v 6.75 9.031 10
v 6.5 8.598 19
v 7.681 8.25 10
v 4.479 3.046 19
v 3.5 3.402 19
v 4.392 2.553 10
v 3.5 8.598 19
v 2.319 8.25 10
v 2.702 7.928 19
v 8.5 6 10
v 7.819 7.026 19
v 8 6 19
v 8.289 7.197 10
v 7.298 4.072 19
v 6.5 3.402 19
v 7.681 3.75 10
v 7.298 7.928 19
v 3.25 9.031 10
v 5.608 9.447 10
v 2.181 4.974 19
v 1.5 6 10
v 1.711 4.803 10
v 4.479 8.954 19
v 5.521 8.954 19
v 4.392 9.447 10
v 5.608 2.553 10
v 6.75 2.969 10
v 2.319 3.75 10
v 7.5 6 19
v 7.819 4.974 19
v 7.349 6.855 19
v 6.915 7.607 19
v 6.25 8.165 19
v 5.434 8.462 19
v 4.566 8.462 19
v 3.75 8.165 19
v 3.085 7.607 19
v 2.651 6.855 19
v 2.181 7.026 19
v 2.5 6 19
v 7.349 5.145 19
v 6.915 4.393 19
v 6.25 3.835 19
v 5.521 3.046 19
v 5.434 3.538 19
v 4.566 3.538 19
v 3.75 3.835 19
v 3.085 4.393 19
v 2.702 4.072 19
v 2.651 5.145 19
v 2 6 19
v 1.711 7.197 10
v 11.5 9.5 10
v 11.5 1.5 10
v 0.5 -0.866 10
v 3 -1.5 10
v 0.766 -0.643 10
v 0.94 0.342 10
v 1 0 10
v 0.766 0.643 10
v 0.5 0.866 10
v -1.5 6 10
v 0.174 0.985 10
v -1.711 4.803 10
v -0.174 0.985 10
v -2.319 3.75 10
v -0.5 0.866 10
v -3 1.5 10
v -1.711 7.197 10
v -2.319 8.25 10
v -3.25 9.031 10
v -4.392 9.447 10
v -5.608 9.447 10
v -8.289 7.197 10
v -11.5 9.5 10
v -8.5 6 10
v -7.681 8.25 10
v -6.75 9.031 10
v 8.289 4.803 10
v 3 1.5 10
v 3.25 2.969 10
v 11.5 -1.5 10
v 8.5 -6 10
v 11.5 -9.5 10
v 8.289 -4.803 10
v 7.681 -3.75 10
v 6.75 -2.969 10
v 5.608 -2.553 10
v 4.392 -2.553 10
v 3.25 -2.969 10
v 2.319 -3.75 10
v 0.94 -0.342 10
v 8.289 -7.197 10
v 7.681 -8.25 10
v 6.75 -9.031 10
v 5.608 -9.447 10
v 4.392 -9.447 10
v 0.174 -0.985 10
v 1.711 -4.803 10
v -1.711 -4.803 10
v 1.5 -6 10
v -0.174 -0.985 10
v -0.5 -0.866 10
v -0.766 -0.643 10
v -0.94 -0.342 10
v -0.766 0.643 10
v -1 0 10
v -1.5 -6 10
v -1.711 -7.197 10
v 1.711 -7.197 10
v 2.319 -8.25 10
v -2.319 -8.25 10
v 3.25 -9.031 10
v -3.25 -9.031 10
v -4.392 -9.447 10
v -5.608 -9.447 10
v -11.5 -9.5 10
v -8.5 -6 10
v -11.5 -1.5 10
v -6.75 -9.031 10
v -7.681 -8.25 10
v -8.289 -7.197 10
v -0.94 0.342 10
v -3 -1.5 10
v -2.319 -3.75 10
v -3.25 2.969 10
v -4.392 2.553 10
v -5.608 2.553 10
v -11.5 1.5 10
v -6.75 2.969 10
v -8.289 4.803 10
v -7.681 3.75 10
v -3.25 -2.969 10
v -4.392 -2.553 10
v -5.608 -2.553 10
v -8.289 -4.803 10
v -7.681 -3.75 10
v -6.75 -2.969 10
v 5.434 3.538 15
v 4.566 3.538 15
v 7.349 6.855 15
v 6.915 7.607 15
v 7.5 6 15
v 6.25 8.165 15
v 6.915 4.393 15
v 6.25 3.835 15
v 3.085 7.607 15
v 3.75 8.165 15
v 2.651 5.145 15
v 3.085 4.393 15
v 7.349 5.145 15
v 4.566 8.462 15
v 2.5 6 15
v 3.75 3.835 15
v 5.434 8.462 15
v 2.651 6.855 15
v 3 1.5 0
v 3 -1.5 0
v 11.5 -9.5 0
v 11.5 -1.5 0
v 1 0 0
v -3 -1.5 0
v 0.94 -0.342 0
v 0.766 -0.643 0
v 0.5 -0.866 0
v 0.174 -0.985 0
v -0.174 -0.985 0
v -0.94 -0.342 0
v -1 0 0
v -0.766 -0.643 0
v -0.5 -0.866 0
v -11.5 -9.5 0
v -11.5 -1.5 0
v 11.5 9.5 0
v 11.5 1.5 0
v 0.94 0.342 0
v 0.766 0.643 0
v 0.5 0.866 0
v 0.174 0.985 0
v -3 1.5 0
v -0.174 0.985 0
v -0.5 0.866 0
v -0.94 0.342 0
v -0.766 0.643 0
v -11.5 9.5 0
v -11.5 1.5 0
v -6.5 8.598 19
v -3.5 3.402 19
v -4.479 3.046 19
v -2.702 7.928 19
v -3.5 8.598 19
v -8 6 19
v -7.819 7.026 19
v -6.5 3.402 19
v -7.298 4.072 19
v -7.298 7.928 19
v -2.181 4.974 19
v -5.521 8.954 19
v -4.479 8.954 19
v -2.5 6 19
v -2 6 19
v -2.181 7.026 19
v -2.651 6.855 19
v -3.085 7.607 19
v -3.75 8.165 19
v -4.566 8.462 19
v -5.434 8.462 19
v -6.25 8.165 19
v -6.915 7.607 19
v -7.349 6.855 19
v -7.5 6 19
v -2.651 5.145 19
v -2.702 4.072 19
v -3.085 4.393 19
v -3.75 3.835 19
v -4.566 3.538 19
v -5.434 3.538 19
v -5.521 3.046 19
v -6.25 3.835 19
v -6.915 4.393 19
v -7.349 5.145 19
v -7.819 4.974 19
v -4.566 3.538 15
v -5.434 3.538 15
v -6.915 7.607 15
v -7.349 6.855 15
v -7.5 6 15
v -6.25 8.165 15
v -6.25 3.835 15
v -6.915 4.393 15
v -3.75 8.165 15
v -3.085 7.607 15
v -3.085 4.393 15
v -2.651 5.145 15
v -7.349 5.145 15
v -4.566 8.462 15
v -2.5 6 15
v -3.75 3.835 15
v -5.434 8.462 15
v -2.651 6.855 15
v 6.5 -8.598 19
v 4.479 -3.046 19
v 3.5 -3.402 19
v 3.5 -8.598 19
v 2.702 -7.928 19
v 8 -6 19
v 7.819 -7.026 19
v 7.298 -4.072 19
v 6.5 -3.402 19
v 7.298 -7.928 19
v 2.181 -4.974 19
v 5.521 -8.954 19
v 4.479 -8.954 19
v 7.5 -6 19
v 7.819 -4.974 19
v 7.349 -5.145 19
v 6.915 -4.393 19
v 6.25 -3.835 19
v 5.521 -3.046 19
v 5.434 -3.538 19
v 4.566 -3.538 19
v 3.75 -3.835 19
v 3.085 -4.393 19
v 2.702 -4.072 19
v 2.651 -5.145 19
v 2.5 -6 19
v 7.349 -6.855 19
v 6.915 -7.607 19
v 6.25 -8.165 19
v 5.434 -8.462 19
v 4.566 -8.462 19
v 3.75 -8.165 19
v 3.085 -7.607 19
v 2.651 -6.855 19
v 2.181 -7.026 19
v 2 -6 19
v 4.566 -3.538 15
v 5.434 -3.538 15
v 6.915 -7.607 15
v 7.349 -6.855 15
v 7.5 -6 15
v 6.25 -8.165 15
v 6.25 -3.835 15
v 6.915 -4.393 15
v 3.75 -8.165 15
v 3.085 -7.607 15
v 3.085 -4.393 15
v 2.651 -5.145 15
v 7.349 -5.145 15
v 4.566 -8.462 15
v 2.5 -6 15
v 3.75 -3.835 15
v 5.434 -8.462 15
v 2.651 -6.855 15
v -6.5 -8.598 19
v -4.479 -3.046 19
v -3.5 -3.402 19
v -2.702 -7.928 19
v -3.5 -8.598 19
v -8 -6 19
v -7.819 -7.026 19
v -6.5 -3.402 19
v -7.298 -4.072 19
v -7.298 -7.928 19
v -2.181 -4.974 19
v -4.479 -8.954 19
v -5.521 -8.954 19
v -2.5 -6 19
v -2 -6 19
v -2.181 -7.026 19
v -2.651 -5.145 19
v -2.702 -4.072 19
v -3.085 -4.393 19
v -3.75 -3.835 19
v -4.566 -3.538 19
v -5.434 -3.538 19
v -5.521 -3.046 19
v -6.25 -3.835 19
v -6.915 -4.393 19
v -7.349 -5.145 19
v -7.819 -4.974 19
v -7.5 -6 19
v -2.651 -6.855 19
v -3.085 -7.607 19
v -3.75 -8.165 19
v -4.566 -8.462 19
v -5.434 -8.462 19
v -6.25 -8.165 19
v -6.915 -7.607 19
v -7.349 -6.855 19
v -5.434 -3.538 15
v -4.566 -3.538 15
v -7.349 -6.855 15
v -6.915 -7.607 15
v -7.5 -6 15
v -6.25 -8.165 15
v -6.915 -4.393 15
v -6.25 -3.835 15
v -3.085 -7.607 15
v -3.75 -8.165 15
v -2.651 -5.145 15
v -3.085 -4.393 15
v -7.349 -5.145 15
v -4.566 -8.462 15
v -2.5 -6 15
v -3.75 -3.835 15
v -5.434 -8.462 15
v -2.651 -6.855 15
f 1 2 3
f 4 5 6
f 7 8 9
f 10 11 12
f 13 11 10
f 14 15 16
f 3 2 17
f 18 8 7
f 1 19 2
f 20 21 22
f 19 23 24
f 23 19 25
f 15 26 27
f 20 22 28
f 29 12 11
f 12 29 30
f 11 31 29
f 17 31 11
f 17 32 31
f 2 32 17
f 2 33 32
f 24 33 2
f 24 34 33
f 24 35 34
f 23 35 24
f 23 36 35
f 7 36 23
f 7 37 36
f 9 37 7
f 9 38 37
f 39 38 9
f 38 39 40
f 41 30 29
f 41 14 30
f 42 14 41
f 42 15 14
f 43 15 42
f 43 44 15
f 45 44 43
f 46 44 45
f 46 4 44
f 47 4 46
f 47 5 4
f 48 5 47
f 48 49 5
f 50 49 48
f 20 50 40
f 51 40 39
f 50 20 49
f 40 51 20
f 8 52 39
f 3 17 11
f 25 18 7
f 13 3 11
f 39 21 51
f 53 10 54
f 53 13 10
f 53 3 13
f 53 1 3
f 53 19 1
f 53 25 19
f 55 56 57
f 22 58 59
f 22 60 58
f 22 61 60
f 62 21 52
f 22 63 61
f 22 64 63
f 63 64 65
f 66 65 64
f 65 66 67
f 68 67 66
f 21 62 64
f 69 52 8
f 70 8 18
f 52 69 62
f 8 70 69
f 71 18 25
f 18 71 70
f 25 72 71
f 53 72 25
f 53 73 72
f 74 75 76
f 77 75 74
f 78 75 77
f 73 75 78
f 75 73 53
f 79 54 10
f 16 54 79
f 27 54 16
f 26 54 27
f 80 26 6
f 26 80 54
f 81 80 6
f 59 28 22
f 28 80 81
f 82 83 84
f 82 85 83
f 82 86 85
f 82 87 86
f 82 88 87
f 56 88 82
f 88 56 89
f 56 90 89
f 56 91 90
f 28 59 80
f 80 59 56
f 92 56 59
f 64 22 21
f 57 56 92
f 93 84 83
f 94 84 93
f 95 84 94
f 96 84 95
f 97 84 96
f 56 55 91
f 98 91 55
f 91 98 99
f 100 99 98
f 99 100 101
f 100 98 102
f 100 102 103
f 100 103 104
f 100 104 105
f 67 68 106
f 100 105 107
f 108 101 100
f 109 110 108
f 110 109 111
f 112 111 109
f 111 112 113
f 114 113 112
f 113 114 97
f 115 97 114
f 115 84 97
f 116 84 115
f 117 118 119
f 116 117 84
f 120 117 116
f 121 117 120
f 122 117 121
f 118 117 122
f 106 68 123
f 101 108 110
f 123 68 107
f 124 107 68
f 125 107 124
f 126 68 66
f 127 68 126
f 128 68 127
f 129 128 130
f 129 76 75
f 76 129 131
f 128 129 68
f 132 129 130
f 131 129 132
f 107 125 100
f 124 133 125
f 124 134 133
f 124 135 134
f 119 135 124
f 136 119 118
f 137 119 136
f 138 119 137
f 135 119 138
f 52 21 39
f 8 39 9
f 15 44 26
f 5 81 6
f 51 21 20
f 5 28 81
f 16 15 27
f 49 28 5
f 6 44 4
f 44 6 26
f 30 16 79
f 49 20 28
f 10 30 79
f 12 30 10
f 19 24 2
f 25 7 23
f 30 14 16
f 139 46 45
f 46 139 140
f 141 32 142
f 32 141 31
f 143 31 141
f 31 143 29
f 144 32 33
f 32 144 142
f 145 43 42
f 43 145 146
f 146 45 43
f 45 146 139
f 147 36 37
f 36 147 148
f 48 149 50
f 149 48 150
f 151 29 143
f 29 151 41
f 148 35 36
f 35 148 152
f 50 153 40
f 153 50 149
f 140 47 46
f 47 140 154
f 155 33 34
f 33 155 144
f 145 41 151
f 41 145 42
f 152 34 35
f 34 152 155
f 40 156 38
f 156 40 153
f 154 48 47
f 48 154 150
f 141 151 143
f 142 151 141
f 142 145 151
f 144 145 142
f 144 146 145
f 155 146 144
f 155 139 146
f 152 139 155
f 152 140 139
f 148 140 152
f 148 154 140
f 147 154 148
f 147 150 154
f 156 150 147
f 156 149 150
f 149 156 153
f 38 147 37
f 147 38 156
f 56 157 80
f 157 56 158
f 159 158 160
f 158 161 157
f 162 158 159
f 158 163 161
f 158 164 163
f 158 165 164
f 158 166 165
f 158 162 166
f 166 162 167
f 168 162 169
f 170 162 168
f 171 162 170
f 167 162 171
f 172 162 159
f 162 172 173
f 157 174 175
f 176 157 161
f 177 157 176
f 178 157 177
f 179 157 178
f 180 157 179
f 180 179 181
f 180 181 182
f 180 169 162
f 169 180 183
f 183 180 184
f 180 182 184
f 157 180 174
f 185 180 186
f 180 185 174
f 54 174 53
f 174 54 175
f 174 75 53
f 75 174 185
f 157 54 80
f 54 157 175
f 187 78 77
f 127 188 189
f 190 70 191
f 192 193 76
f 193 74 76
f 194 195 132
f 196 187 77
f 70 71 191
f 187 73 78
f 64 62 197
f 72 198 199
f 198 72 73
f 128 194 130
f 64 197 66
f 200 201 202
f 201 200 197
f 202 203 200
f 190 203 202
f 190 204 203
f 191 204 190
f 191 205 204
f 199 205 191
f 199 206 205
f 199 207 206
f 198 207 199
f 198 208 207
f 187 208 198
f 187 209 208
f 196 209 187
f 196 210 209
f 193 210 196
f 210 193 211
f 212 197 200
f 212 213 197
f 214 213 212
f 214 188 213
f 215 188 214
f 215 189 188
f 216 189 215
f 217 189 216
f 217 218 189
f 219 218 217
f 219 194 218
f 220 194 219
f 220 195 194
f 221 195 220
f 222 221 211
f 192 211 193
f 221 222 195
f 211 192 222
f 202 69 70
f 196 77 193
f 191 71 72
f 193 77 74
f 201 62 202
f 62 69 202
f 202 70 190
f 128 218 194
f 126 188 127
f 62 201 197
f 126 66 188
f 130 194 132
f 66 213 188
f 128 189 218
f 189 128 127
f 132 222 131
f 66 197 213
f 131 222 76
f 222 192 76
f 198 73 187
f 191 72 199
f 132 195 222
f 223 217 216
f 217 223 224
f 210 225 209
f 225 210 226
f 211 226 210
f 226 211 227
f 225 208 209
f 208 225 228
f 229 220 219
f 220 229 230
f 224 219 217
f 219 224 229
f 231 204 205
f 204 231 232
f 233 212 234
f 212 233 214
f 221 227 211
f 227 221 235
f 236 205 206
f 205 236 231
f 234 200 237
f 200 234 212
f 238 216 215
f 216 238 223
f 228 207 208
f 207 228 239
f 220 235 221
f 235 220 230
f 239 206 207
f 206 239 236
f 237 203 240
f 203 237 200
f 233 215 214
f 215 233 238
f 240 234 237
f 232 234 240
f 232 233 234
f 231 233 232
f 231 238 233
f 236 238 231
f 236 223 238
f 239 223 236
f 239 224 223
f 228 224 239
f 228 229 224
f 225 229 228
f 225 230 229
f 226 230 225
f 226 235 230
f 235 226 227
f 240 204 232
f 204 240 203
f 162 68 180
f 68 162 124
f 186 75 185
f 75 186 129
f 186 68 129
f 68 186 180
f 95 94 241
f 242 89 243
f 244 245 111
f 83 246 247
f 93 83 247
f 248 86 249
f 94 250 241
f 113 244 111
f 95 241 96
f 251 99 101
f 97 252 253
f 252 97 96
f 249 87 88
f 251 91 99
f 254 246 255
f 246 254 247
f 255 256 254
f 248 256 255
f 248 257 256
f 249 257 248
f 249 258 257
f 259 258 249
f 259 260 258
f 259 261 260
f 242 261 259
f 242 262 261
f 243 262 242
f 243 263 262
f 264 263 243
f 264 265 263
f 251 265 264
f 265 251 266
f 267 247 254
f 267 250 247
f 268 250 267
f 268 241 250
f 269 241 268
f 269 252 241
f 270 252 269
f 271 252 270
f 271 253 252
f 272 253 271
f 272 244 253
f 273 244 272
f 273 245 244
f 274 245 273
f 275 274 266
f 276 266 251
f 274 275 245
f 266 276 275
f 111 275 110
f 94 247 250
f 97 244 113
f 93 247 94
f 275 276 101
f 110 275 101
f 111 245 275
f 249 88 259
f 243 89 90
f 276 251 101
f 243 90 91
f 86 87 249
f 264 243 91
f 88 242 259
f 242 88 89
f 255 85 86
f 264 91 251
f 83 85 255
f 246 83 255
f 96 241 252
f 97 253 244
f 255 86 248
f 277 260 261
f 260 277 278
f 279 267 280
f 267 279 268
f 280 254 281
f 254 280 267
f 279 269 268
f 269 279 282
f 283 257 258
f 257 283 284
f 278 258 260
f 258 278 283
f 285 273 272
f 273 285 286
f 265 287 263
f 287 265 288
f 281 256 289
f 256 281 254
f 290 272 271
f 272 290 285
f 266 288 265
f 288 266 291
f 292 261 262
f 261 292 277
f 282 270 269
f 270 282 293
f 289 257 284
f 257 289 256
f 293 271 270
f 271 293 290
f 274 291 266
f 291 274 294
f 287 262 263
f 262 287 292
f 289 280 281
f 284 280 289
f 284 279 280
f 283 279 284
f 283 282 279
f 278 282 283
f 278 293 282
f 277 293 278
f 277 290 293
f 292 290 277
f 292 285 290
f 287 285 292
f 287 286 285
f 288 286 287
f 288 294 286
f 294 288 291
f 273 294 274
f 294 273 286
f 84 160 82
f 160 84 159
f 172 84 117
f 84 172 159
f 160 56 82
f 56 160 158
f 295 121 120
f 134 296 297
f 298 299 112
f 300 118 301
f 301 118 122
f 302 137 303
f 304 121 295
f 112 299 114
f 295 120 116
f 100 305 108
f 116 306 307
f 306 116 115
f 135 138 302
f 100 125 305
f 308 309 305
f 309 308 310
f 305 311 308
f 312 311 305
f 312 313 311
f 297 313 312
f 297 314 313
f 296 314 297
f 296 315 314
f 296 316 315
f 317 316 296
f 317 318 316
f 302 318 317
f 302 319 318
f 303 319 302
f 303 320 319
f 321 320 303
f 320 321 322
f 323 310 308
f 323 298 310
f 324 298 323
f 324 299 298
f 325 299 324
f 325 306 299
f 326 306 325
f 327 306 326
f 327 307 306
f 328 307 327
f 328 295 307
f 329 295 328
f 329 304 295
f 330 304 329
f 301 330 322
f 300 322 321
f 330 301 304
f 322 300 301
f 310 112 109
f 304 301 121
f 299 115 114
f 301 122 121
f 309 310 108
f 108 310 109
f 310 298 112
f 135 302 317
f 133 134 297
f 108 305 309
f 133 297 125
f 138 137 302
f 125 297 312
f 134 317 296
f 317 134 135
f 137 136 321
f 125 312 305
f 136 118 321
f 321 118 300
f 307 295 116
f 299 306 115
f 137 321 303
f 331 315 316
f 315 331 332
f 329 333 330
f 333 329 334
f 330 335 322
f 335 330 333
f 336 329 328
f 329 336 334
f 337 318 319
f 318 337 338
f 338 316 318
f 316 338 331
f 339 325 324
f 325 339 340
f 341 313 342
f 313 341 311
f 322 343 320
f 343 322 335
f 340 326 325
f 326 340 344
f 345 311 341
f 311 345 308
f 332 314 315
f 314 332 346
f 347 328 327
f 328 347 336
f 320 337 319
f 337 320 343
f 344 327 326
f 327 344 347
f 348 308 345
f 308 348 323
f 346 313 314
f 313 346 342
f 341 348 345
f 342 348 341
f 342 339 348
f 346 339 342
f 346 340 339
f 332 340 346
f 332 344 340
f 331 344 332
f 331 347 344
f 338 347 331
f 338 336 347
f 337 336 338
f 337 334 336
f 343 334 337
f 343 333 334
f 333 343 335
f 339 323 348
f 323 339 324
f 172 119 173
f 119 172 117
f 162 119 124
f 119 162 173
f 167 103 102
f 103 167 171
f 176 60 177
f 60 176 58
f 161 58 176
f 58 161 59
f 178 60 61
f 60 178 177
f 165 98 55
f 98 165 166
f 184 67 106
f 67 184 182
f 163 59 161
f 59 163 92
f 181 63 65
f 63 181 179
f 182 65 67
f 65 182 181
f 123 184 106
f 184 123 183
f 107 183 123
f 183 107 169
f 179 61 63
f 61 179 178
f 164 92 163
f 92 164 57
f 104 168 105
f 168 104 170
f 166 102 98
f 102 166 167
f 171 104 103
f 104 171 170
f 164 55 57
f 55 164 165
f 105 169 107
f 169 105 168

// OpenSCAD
difference()
{
    mirror_copy([0,1,0])
    {
        mirror_copy()
        {
            cube([3,2,10]);
            translate([0,1.5,0])
                cube([11.5, 8, 10]);
            translate([5,6,10])
            {
                difference()
                {
                    cylinder(d1 = 7, d2=6, 9, $fn=18);
                    translate([0,0,5])
                        cylinder(d = 5, 4, $fn=18);
                }
            }
        }
    }
    
    cylinder(d = 2, 10, $fn=18);
}


module mirror_copy(v = [1, 0, 0]) 
{
    children();
    mirror(v) children();
}
